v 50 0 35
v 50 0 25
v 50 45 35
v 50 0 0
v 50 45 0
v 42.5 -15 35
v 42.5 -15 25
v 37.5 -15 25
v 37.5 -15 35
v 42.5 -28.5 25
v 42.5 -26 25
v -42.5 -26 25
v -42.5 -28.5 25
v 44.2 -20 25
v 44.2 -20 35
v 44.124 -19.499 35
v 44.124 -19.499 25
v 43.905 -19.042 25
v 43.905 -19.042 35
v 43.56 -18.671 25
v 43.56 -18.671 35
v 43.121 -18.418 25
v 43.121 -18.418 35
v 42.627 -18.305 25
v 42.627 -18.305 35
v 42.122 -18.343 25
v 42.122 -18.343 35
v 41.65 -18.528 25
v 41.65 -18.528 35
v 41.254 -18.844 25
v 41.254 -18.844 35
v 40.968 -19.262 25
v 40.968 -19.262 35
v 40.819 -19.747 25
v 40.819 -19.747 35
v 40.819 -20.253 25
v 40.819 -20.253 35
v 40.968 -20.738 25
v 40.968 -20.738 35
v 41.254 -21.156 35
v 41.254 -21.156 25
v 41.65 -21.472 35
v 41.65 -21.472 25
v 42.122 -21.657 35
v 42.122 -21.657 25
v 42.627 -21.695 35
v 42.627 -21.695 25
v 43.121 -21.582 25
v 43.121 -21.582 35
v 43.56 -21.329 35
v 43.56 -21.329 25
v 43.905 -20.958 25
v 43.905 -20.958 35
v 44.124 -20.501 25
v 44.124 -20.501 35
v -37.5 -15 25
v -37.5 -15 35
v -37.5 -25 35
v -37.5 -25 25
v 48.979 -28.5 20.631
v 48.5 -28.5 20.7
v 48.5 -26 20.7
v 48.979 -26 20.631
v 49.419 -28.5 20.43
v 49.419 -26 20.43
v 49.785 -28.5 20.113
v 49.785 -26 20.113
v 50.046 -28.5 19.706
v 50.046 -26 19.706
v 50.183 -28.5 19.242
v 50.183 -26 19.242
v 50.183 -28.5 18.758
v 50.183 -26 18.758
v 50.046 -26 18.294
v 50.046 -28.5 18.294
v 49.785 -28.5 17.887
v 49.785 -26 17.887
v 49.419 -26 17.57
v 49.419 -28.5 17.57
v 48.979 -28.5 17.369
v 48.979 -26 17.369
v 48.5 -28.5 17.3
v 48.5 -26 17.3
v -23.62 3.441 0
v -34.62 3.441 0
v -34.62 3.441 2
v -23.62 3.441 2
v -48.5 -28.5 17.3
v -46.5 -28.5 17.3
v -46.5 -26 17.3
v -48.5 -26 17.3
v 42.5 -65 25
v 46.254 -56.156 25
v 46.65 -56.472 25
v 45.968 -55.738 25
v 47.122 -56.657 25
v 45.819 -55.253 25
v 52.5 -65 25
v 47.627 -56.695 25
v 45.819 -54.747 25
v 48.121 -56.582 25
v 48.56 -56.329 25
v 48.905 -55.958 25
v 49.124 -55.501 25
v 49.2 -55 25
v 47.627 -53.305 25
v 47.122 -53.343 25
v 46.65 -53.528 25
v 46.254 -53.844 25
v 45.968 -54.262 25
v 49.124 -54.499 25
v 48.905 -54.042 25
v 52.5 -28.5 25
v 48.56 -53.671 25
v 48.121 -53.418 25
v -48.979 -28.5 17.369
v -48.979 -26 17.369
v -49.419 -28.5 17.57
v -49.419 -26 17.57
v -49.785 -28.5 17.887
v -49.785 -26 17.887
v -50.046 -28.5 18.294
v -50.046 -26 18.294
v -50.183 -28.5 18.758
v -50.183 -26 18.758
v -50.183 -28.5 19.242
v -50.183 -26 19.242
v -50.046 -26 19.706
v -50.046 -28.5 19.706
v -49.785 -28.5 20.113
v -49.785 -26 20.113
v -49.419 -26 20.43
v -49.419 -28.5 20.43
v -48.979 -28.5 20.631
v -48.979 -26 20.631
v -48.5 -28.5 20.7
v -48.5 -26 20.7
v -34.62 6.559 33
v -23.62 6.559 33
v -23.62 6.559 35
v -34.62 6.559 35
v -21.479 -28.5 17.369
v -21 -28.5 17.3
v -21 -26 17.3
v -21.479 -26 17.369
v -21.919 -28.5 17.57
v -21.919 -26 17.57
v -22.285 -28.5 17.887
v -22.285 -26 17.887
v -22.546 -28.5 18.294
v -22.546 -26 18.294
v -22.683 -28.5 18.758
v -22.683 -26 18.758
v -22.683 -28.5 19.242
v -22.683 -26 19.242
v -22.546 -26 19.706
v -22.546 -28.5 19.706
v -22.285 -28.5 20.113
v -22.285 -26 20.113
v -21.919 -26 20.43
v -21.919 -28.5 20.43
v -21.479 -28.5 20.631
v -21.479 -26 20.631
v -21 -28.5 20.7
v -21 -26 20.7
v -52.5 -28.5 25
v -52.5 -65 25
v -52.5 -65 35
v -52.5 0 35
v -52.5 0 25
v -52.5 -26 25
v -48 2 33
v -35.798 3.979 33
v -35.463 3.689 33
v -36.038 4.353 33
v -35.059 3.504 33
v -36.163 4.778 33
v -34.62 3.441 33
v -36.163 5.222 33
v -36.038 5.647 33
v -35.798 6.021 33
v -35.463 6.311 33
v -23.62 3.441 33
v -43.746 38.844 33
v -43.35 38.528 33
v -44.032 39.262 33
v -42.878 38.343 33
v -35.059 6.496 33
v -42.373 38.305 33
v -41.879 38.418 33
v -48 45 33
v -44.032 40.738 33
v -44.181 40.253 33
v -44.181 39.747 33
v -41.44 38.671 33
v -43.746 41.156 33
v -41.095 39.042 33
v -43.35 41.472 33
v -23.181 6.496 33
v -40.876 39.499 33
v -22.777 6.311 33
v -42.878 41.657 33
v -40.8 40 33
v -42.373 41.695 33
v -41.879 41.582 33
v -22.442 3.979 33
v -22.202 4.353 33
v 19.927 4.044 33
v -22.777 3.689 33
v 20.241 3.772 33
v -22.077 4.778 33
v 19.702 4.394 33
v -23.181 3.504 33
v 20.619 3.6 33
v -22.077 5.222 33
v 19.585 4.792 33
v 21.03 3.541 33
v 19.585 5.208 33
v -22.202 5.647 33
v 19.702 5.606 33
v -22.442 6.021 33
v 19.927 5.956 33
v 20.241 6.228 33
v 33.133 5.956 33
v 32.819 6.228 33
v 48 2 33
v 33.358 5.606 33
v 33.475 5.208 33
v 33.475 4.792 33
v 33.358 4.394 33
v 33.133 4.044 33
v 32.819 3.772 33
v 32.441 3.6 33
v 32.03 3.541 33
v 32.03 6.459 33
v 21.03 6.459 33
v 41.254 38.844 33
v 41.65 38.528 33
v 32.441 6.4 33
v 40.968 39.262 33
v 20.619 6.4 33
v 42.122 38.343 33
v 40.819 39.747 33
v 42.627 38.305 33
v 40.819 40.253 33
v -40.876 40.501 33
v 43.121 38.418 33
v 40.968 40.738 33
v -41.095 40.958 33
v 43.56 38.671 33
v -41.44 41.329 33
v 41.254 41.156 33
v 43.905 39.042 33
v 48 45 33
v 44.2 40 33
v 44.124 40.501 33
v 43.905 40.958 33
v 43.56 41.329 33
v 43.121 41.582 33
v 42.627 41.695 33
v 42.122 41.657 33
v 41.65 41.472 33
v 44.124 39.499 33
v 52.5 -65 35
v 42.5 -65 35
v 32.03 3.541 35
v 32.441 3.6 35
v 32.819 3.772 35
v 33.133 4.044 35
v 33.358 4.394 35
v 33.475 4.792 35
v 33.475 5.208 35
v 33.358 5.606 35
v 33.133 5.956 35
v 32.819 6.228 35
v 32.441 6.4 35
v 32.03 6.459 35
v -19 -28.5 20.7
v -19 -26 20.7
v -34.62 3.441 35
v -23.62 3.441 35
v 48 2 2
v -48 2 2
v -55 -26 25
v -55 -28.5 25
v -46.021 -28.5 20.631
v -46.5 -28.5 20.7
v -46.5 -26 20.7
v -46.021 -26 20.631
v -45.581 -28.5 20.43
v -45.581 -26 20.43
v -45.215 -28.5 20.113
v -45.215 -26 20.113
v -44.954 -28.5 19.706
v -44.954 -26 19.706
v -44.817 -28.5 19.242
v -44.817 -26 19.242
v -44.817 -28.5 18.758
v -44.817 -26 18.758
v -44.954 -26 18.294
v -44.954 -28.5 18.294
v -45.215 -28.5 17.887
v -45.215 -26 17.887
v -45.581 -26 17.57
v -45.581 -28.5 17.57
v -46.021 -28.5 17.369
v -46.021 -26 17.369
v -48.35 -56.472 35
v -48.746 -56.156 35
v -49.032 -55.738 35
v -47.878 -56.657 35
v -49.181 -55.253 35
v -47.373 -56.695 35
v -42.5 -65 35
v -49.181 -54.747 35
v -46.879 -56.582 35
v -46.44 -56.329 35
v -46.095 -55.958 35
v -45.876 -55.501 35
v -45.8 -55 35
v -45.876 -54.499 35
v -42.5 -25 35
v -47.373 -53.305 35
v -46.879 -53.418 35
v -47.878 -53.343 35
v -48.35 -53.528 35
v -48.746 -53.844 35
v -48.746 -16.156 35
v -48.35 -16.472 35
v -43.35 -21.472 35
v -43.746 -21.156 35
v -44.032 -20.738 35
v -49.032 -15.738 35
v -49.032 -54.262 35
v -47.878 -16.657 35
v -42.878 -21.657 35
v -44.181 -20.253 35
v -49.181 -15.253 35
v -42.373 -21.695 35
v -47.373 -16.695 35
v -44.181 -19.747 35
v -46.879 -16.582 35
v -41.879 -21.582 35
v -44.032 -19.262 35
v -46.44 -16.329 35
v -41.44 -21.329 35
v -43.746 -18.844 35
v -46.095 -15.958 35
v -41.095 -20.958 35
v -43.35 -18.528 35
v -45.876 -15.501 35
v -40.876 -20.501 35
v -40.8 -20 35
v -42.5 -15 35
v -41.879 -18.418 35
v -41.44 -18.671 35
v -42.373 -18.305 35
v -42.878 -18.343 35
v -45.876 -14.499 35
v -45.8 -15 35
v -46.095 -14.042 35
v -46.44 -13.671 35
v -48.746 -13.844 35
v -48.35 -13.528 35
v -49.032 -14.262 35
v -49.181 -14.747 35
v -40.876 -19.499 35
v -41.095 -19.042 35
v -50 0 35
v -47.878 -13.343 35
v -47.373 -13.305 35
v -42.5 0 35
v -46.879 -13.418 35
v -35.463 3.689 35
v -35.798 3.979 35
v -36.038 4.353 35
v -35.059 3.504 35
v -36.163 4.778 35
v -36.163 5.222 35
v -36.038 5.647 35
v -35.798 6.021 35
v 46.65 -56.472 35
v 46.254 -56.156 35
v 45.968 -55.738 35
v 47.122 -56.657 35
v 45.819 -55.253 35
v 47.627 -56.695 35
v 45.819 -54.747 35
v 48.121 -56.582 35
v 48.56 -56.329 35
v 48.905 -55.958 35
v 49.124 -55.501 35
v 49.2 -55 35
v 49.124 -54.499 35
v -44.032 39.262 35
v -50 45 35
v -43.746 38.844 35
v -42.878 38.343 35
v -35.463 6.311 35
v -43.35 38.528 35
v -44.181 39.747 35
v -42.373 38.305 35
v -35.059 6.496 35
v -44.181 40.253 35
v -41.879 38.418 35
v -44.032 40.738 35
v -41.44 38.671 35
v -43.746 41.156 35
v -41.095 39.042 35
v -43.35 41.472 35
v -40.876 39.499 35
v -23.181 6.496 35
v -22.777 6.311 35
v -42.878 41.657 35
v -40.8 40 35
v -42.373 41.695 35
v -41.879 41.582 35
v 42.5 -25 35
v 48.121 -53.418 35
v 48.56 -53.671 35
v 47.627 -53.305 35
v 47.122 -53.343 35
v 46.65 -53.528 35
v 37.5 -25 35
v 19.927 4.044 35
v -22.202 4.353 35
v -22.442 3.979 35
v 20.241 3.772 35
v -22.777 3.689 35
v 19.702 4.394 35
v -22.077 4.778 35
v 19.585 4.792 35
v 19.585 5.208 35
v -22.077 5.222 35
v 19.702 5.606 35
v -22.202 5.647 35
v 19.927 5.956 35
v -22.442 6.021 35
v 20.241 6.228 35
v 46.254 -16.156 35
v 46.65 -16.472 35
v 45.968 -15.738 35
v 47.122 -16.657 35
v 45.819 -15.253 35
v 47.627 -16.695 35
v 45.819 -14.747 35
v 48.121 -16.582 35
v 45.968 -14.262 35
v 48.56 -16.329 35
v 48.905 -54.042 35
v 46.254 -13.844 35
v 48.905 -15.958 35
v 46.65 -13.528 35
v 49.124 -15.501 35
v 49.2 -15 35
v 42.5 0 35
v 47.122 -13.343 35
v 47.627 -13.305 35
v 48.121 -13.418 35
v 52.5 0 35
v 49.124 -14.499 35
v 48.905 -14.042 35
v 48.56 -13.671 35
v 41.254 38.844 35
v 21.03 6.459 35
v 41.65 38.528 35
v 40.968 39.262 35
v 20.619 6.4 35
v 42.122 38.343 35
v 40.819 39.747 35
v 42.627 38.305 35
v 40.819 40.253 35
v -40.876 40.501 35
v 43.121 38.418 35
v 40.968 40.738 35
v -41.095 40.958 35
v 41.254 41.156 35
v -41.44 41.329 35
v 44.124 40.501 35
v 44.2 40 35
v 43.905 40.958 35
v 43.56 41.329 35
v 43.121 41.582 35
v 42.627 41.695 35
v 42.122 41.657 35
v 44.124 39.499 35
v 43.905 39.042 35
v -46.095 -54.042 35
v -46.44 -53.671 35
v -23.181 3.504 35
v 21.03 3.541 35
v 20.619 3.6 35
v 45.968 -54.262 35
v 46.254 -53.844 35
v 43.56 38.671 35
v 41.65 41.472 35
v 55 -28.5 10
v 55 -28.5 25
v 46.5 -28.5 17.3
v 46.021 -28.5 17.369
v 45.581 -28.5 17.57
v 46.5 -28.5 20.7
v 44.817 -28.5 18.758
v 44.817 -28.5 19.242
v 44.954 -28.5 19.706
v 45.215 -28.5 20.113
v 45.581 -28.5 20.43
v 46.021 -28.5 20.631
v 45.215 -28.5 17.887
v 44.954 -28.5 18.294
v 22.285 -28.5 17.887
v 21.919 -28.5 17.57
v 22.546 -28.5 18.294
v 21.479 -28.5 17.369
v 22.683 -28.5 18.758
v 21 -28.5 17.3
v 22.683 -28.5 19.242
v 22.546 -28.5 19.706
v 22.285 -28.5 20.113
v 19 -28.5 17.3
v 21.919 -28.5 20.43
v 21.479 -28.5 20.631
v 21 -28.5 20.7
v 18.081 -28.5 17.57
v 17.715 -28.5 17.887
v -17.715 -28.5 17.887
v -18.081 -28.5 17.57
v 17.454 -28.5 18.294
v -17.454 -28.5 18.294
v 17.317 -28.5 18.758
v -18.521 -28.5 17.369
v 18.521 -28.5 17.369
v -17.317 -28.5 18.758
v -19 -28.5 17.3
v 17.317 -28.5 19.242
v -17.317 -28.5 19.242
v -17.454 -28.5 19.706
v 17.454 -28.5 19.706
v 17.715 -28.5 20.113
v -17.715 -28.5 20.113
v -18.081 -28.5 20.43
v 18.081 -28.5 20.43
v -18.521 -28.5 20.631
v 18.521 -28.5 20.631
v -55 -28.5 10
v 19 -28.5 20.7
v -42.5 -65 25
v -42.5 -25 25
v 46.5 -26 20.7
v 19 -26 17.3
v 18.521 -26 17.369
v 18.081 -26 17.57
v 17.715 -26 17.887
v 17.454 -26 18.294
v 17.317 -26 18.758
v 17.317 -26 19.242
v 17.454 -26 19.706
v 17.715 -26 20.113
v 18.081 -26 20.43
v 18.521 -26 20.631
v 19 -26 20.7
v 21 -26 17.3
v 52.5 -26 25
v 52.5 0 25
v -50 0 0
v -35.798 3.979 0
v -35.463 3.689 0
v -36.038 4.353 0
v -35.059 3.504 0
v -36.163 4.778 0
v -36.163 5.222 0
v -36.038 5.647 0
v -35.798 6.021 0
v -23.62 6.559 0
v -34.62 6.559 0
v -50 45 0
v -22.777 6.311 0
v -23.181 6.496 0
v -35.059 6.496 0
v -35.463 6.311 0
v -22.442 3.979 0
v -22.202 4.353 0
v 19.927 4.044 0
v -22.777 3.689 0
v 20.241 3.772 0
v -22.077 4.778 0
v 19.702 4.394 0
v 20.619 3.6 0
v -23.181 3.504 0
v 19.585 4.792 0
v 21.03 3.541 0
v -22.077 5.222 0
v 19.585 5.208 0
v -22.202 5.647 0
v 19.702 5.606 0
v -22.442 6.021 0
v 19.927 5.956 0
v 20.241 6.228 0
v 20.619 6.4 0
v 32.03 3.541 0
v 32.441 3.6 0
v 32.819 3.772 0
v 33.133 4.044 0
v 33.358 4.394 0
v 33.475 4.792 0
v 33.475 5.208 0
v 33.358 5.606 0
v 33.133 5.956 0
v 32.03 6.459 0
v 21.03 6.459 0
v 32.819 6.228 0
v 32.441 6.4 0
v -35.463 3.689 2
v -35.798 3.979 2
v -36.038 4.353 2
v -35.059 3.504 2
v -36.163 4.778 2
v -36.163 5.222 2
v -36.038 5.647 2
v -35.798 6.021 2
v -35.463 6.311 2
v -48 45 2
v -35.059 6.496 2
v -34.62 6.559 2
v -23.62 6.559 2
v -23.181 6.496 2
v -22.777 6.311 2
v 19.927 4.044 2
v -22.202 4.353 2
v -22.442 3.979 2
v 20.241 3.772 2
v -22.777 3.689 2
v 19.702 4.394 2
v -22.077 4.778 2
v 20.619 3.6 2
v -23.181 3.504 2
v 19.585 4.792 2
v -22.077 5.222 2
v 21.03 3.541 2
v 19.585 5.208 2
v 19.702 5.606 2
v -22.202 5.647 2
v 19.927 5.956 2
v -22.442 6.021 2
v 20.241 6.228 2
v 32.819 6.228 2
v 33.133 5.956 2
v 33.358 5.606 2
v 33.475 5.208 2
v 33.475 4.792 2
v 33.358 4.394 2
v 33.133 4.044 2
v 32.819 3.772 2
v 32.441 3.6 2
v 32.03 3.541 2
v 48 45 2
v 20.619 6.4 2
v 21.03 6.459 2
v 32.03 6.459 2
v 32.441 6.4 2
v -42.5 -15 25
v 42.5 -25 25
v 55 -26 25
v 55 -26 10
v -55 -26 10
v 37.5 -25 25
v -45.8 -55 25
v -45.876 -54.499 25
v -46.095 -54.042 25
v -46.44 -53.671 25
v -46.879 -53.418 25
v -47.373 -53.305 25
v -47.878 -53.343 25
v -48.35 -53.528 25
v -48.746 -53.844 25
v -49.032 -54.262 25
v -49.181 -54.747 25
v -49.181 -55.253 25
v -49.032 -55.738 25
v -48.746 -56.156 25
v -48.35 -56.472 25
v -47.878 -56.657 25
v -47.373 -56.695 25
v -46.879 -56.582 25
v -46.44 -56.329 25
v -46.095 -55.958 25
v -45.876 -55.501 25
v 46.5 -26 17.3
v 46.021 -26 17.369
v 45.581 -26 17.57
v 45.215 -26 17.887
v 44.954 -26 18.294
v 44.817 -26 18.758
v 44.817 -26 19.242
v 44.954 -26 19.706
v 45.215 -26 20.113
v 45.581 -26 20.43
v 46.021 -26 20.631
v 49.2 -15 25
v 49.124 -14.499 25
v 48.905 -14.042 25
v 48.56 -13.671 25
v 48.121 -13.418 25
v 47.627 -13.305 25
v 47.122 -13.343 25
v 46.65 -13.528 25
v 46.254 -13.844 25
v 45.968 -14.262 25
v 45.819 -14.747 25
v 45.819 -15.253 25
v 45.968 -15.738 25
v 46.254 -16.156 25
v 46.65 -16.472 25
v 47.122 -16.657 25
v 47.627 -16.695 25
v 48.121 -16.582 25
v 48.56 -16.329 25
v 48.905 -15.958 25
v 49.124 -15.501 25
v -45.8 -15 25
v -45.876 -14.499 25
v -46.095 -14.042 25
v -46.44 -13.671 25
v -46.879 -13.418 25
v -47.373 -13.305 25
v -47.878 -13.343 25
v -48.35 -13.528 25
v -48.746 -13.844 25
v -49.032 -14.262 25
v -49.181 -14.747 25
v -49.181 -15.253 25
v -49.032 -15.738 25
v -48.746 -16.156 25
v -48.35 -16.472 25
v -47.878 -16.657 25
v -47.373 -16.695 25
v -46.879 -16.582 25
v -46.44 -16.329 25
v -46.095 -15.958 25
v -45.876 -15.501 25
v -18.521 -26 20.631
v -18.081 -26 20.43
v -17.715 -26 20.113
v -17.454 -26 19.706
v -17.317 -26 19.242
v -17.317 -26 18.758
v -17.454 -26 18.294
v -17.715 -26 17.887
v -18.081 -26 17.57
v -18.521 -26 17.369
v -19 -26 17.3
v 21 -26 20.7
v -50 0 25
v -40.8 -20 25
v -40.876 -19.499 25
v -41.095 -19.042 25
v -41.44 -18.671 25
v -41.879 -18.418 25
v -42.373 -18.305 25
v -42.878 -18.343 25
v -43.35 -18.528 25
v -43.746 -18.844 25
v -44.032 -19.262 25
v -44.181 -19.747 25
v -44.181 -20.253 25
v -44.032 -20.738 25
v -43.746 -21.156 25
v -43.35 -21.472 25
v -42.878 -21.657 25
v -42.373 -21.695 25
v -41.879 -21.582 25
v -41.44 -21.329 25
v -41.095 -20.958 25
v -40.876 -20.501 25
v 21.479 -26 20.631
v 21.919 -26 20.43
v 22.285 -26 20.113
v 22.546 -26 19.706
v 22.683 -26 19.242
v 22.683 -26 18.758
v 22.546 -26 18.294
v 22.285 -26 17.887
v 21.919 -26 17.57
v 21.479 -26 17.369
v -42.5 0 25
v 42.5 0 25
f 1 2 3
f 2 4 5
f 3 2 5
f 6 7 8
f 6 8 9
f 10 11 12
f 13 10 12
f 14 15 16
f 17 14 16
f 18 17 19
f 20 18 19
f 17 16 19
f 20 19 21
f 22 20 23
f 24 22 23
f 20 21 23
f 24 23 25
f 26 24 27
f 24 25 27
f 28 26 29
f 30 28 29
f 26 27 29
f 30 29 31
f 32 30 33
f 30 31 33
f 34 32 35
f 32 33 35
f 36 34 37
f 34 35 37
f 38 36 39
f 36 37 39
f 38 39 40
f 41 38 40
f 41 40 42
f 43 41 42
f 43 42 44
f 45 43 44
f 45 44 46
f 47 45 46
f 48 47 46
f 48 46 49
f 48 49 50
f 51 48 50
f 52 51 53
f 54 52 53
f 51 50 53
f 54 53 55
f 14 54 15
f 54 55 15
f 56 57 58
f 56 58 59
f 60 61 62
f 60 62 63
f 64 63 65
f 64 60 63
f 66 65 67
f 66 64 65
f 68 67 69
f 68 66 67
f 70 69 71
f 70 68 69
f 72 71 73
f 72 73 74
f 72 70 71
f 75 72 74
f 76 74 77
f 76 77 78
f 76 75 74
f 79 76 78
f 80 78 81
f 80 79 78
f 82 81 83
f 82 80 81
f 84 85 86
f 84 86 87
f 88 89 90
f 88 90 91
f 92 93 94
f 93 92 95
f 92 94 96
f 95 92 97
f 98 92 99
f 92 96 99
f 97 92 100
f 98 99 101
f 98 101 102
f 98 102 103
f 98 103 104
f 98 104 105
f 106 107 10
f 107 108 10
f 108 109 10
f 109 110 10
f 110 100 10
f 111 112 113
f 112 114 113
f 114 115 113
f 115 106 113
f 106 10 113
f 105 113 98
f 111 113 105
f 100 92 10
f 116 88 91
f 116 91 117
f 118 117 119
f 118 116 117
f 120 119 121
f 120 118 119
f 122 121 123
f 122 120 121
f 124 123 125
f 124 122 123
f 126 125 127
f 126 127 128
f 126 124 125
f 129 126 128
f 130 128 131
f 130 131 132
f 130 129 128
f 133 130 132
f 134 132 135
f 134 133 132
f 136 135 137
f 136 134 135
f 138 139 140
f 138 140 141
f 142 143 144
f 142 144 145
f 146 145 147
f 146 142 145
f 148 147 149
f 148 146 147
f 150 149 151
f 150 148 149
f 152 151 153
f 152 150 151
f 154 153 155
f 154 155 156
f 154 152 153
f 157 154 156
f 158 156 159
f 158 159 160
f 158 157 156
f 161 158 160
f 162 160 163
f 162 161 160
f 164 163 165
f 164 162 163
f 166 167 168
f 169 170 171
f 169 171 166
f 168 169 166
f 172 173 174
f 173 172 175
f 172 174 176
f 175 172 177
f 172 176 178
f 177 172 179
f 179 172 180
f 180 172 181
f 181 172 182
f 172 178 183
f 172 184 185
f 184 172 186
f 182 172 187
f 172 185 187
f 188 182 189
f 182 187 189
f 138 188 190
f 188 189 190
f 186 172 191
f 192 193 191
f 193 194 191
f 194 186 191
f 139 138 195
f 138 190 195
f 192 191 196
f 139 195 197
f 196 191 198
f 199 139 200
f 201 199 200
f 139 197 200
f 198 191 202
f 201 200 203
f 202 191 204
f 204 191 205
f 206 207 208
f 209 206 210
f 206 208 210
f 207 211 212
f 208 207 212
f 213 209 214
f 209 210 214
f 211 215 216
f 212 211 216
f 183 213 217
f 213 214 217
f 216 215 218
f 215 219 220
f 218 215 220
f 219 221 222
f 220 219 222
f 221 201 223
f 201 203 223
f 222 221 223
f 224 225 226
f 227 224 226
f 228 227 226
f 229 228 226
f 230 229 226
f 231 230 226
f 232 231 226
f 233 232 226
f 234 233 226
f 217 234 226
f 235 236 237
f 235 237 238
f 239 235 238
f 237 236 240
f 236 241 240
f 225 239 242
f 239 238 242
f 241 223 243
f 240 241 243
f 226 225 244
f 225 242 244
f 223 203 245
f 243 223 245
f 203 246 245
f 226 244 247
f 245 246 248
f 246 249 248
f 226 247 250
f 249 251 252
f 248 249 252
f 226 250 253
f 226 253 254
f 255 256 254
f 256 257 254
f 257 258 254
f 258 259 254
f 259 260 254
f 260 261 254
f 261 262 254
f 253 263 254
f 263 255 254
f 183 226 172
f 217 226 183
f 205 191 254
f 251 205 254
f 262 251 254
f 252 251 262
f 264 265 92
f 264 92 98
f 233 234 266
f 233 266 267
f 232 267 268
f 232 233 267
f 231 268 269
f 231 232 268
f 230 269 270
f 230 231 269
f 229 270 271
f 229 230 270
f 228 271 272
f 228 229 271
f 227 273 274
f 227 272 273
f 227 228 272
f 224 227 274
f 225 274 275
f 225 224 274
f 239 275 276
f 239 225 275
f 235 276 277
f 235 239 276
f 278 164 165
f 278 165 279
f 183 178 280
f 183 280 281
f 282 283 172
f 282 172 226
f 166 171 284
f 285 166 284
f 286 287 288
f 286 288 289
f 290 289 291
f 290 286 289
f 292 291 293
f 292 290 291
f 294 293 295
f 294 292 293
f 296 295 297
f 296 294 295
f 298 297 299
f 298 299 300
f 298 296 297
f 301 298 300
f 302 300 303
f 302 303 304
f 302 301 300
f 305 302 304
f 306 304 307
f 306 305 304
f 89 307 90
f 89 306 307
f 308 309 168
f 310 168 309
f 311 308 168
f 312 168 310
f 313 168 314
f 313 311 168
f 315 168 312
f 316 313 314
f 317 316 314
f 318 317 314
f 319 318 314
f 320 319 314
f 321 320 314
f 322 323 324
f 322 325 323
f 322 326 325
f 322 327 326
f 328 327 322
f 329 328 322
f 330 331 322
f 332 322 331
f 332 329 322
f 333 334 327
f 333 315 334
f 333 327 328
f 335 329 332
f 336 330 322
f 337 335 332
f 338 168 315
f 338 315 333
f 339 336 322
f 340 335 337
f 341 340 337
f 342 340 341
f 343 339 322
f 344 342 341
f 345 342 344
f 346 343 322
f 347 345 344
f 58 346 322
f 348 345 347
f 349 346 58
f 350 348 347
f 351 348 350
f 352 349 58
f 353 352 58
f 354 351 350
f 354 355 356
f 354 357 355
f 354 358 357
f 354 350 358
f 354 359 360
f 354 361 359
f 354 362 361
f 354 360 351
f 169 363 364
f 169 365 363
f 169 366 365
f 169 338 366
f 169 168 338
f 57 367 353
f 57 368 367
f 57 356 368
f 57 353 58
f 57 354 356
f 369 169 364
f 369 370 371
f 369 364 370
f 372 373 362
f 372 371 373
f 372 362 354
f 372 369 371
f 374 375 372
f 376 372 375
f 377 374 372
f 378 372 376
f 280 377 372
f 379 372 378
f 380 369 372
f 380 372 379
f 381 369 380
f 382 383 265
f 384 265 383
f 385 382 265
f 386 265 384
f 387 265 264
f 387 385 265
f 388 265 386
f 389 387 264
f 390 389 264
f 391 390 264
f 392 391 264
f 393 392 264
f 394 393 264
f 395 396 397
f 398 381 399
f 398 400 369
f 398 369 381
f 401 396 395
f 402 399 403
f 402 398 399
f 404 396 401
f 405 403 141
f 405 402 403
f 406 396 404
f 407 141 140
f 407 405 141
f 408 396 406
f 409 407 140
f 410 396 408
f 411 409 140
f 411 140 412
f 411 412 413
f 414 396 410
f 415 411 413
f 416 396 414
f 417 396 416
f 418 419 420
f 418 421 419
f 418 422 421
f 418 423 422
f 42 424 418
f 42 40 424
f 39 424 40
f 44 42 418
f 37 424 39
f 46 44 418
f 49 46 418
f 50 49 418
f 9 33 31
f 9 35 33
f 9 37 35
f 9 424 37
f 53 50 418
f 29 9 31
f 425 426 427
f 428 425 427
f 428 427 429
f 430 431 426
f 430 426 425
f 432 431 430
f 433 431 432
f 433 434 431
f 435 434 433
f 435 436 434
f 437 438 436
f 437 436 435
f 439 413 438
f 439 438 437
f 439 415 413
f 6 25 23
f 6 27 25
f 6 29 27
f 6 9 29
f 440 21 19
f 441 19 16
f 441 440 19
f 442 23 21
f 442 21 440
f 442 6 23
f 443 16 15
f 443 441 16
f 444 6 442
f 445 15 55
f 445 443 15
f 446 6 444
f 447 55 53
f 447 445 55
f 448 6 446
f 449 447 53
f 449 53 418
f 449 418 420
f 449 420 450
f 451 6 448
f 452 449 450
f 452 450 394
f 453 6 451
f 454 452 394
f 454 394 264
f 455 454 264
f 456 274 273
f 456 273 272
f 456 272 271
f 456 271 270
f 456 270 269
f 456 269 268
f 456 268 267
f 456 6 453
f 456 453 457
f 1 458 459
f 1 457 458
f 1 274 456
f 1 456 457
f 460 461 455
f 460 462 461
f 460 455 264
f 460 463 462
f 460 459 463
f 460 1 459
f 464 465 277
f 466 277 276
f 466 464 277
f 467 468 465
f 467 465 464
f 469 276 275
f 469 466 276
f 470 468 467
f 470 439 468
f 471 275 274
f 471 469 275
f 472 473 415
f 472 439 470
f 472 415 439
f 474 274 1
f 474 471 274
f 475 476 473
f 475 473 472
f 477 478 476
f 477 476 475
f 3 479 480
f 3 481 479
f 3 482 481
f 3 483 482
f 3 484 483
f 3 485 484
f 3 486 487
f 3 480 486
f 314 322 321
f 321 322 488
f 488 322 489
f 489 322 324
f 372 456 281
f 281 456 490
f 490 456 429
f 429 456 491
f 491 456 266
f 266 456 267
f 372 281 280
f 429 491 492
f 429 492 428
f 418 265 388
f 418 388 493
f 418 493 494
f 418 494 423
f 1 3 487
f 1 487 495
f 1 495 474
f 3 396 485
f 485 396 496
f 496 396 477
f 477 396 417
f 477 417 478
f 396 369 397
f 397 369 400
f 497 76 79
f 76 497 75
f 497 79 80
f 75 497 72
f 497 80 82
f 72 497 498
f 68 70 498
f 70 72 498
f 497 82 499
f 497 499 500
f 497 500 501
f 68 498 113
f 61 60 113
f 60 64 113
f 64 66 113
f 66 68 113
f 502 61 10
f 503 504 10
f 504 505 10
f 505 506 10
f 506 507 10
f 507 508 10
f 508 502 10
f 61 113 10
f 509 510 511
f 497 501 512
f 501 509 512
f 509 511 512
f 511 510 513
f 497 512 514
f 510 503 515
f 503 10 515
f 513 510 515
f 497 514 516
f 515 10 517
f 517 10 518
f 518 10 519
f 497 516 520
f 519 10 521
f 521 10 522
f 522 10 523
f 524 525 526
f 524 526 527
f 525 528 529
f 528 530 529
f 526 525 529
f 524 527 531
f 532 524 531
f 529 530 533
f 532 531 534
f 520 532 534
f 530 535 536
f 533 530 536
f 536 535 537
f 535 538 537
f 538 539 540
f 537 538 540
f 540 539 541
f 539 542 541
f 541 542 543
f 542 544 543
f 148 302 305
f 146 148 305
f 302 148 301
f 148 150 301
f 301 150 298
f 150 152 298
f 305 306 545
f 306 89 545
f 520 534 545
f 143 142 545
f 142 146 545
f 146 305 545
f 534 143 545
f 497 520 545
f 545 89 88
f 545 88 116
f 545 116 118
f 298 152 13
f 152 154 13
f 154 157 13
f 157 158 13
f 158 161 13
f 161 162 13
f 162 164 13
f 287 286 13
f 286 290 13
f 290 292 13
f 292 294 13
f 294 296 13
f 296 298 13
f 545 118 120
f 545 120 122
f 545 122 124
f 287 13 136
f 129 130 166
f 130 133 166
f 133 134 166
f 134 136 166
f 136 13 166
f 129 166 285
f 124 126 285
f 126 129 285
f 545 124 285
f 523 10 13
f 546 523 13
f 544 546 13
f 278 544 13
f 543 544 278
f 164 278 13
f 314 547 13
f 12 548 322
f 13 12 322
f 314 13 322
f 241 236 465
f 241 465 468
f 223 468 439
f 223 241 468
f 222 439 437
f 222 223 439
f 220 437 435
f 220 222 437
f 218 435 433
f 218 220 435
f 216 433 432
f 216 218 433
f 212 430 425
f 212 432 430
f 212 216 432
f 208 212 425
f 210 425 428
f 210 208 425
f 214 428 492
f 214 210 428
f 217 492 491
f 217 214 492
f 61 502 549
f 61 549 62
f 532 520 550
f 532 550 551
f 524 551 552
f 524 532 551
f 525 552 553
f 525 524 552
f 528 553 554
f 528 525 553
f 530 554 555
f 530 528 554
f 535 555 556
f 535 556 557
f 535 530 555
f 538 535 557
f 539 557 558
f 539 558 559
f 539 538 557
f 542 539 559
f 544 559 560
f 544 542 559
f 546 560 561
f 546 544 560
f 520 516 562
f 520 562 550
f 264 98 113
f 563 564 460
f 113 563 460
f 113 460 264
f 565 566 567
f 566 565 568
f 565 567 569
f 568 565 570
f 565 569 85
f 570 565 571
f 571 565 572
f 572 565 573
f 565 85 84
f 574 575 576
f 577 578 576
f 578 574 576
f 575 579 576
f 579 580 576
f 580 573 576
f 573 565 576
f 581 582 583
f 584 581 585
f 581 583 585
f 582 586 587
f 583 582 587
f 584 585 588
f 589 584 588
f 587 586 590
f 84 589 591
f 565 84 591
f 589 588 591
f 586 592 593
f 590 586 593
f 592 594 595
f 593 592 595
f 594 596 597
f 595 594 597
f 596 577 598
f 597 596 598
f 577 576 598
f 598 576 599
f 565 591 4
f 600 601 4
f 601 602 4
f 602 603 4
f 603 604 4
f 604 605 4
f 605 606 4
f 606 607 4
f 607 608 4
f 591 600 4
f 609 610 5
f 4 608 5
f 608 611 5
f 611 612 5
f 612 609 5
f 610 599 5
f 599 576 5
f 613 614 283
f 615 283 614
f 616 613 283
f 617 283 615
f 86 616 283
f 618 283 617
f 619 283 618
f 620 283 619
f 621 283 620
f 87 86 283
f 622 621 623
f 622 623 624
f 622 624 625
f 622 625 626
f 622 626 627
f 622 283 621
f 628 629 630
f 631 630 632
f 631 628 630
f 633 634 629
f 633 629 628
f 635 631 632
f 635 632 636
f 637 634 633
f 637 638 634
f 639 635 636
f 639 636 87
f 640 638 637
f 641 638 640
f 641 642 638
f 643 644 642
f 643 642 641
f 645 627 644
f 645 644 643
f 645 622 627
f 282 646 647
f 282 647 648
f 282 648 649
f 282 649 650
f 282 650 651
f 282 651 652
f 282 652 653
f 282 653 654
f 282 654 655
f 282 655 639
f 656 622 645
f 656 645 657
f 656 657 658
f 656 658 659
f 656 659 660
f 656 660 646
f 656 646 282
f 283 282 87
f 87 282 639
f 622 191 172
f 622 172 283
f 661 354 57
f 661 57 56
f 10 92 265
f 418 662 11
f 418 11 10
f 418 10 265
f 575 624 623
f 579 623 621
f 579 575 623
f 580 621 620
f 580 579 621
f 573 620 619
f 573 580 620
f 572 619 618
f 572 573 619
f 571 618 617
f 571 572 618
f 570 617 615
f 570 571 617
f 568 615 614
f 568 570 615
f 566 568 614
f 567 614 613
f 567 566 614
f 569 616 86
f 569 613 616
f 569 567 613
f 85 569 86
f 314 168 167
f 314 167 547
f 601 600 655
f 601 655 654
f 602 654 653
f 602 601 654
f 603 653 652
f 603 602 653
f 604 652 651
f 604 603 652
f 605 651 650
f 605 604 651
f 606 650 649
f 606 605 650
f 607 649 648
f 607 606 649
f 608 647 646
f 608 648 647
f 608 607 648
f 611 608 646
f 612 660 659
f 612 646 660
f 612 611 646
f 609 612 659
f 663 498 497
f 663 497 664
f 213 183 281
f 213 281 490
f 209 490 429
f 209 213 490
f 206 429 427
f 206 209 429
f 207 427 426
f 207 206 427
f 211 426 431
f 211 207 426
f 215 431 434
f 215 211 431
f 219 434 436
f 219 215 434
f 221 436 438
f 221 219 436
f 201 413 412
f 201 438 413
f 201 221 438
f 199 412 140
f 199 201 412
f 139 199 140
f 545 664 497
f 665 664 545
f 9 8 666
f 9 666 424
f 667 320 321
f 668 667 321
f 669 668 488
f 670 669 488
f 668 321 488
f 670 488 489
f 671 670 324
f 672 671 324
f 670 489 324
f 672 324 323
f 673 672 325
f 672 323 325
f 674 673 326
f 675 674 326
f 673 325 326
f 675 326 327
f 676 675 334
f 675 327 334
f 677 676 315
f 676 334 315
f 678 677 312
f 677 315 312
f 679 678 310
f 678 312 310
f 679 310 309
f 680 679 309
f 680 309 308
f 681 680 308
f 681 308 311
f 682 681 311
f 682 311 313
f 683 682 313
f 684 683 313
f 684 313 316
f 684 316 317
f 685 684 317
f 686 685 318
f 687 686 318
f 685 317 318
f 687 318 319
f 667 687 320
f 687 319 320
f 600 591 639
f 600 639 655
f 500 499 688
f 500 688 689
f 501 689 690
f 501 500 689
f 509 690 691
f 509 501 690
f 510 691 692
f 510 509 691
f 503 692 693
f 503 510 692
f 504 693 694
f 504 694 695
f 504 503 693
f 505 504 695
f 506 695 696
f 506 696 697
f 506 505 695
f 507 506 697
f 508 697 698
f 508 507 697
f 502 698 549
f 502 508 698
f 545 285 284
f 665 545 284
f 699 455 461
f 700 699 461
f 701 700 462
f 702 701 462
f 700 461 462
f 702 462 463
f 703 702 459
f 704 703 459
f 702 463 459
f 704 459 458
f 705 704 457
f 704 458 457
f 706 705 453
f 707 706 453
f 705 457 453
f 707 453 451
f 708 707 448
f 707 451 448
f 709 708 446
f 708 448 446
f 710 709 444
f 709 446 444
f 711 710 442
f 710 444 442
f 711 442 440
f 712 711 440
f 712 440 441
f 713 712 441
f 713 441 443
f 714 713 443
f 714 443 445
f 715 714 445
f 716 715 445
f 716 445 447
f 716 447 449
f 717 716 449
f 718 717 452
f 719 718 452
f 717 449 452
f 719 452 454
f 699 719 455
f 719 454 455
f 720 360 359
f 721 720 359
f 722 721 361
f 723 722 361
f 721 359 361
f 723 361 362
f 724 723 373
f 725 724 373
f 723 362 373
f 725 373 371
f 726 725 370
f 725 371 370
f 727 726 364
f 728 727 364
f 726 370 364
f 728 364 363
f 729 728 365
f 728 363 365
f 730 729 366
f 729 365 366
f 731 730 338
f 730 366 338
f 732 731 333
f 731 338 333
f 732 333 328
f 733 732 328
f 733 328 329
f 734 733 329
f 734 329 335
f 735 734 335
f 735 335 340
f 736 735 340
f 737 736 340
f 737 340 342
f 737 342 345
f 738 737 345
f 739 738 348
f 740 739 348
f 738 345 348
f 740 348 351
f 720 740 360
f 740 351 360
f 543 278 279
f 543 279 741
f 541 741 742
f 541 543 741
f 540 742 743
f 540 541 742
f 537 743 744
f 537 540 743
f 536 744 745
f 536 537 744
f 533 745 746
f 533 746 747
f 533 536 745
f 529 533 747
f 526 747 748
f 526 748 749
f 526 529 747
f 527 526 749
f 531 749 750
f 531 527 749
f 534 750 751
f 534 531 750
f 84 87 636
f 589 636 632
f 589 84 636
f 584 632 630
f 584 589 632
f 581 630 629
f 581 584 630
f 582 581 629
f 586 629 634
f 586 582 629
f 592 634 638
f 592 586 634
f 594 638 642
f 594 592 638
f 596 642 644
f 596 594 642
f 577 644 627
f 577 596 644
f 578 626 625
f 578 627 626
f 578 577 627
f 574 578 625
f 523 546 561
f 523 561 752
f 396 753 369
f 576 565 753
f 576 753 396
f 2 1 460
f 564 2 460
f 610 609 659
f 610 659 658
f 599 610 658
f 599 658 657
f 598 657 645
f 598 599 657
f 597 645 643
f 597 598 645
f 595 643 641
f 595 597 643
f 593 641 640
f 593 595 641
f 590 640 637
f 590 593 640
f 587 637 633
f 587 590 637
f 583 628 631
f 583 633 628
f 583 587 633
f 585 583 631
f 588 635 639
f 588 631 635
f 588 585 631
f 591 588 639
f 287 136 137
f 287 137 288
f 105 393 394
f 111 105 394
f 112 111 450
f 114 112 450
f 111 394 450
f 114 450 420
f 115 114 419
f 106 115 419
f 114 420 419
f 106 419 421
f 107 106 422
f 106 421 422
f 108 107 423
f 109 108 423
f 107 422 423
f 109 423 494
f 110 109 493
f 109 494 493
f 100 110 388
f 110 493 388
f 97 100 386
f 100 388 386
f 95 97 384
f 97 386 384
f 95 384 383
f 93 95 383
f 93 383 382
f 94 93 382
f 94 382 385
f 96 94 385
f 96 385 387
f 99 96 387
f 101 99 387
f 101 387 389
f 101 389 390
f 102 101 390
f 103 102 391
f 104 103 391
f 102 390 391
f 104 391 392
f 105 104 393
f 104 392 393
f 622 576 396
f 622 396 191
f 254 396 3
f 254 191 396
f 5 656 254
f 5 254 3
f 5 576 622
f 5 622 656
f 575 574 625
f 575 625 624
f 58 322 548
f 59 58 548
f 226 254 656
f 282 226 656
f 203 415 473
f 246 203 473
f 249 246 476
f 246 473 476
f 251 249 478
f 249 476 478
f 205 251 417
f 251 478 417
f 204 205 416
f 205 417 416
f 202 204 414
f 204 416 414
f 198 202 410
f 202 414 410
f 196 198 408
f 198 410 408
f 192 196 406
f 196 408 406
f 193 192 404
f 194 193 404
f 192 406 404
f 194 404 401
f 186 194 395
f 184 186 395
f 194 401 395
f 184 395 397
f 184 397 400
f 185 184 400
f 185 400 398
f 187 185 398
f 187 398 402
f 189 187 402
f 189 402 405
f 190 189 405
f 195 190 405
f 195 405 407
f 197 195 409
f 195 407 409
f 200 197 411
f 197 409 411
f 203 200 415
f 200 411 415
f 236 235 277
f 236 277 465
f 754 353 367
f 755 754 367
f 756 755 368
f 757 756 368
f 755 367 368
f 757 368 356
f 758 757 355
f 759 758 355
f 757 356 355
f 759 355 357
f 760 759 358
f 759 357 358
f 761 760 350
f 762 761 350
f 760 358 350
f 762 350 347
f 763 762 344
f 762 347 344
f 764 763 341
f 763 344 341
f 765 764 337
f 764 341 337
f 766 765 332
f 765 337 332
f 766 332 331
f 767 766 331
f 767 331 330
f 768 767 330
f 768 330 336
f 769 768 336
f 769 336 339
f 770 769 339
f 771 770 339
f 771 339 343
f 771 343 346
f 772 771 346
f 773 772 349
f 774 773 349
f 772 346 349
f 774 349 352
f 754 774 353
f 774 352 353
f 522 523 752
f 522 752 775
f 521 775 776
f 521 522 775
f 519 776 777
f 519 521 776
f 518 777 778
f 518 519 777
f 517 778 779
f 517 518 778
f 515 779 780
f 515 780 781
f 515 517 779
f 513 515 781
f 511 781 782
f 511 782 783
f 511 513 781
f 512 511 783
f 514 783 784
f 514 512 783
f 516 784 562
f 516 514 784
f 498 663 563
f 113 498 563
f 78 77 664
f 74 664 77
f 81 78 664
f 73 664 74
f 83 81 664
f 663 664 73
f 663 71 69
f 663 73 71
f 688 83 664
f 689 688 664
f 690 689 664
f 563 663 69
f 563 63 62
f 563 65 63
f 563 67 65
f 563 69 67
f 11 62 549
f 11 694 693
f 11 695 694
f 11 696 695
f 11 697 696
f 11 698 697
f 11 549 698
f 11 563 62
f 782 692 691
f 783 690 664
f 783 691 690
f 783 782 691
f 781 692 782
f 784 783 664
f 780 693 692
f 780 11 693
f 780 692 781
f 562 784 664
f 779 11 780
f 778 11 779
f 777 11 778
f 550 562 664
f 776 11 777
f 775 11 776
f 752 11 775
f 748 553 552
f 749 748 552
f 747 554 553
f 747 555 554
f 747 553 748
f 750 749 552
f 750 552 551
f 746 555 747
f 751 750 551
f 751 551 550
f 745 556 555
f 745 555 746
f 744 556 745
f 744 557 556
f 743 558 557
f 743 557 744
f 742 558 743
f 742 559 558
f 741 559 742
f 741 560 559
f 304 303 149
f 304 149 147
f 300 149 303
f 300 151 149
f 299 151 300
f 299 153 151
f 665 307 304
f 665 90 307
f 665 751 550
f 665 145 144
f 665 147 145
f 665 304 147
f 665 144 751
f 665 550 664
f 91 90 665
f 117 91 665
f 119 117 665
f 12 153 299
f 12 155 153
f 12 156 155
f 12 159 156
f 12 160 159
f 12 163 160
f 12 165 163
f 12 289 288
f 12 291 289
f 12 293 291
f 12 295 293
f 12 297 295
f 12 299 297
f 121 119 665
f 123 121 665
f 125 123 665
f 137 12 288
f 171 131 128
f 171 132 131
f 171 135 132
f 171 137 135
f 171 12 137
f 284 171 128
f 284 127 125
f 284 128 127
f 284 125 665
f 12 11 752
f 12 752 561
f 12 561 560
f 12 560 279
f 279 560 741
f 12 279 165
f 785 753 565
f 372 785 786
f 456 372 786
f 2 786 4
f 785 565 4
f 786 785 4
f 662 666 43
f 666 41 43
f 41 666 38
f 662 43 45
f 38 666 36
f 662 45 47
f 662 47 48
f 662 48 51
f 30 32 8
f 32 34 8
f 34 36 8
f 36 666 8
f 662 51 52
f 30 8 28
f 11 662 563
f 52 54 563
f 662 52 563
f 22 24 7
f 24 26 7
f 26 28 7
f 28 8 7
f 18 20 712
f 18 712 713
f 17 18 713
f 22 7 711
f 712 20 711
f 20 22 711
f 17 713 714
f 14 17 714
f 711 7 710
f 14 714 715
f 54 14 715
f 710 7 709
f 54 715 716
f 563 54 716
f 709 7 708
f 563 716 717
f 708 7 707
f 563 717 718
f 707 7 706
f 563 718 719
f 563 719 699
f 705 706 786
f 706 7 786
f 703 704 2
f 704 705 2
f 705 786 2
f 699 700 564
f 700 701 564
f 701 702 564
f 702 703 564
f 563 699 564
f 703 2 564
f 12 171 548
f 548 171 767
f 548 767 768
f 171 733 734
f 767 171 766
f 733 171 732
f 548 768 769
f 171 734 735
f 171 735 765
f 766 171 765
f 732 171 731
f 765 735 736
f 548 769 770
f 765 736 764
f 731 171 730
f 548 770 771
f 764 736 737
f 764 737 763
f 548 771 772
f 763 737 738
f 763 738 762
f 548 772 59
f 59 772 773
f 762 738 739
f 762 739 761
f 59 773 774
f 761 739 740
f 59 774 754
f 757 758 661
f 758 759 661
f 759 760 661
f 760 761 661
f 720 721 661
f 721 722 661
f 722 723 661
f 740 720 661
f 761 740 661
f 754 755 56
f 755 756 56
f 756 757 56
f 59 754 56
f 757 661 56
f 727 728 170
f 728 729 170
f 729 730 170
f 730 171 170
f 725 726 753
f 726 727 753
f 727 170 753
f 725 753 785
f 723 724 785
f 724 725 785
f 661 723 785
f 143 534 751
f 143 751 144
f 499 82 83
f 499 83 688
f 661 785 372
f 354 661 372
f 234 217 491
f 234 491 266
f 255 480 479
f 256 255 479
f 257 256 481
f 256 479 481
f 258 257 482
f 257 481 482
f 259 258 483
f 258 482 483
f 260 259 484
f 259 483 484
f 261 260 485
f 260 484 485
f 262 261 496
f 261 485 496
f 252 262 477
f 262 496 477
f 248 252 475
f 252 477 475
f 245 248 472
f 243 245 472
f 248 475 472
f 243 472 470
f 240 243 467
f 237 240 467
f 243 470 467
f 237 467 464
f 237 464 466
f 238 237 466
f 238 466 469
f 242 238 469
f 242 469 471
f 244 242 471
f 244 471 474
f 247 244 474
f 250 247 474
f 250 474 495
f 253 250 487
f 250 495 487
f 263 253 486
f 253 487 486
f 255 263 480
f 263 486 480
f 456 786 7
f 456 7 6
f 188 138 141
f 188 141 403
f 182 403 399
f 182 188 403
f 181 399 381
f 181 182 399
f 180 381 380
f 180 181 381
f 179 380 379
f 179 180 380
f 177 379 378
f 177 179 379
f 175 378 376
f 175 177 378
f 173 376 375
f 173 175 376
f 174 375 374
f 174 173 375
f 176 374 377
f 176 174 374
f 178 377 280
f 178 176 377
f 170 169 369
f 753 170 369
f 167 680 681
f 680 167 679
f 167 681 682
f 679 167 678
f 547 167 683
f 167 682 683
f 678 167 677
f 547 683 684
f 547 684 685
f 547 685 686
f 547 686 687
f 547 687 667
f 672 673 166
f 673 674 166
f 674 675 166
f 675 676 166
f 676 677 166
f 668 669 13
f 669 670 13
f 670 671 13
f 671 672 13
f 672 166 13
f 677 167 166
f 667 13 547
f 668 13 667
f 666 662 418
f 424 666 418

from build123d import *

# Parameters (mm, degrees)
V3_BOX_FOOTPRINT_100_X_45_MM_W                 = 100
V3_BOX_FOOTPRINT_100_X_45_MM_H                 = 45
V3_BOX_HEIGHT_35_MM_DEPTH                      = 35
V3_REAR_OPENING_96_X_31_MM_W                   = 96
V3_REAR_OPENING_96_X_31_MM_H                   = 31
V3_CAVITY_ALL_WALLS_2_MM_DEPTH                 = 43
V3_SQUARE_BEAMS_10_X_10_PITCH_95_MM_W          = 10
V3_SQUARE_BEAMS_10_X_10_PITCH_95_MM_H          = 10
V3_FORWARD_BEAM_LENGTH_65_MM_DEPTH             = 65
V3_LEFT_PCB_EAR_PROFILE_W                      = 10
V3_LEFT_PCB_EAR_PROFILE_H                      = 10
V3_LEFT_INWARD_EAR_5_MM_DEPTH                  = 5
V3_RIGHT_PCB_EAR_PROFILE_W                     = 10
V3_RIGHT_PCB_EAR_PROFILE_H                     = 10
V3_RIGHT_INWARD_EAR_5_MM_DEPTH                 = 5
V3_PCB_ROOF_PAIR_PITCH_85_MM_R                 = 1.7
V3_M3_ROOF_HOLES_DIAMETER_3_4_MM_DEPTH         = 2
V3_PCB_FORWARD_PAIR_ROW_SPACING_60_MM_R        = 1.7
V3_M3_PCB_EAR_HOLES_DEPTH                      = 10
V3_CHASSIS_TOP_HOLES_WIDTH_95_DEPTH_40_M_R     = 1.7
V3_M3_BEAM_TOP_BOTTOM_HOLES_DEPTH              = 10
V3_HANGING_PLATE_OFFSET_26_THICKNESS_2_5_W     = 110
V3_HANGING_PLATE_OFFSET_26_THICKNESS_2_5_H     = 2.5
V3_MOUNTING_PLATE_DOWNWARD_15_MM_WIDTH_1_DEPTH = 15
FOUR_HORIZONTAL_SLOTS_3_4_X_5_4_MM_DEPTH       = 2.5
CUT_EXTRUDE_1_DEPTH                            = 93.059763198


with BuildPart() as part:
    # V3 box footprint 100 x 45 mm → V3 box height 35 mm (new body)
    with BuildSketch(Plane.XY):
        with Locations((0, 22.5)):
            Rectangle(V3_BOX_FOOTPRINT_100_X_45_MM_W, V3_BOX_FOOTPRINT_100_X_45_MM_H)
    extrude(amount=V3_BOX_HEIGHT_35_MM_DEPTH)

    # V3 rear opening 96 x 31 mm → V3 cavity all walls 2 mm (cut)
    with BuildSketch(Plane(origin=(0, 45, 0), x_dir=(1, 0, 0), z_dir=(0, 1, 0))):
        with Locations((0, -17.5)):
            Rectangle(V3_REAR_OPENING_96_X_31_MM_W, V3_REAR_OPENING_96_X_31_MM_H)
    extrude(amount=-V3_CAVITY_ALL_WALLS_2_MM_DEPTH, mode=Mode.SUBTRACT)

    # V3 square beams 10 x 10 pitch 95 mm → V3 forward beam length 65 mm (add)
    with BuildSketch(Plane.XZ):
        with Locations((-47.5, 30)):
            Rectangle(V3_SQUARE_BEAMS_10_X_10_PITCH_95_MM_W, V3_SQUARE_BEAMS_10_X_10_PITCH_95_MM_H)
        with Locations((47.5, 30)):
            Rectangle(V3_SQUARE_BEAMS_10_X_10_PITCH_95_MM_W, V3_SQUARE_BEAMS_10_X_10_PITCH_95_MM_H)
    extrude(amount=V3_FORWARD_BEAM_LENGTH_65_MM_DEPTH)

    # V3 left PCB ear profile → V3 left inward ear 5 mm (add)
    with BuildSketch(Plane(origin=(-42.5, 0, 0), x_dir=(0, 0, -1), z_dir=(1, 0, 0))):
        with Locations((-30, -20)):
            Rectangle(V3_LEFT_PCB_EAR_PROFILE_W, V3_LEFT_PCB_EAR_PROFILE_H)
    extrude(amount=V3_LEFT_INWARD_EAR_5_MM_DEPTH)

    # V3 right PCB ear profile → V3 right inward ear 5 mm (add)
    with BuildSketch(Plane.ZY.offset(-42.5)):
        with Locations((30, -20)):
            Rectangle(V3_RIGHT_PCB_EAR_PROFILE_W, V3_RIGHT_PCB_EAR_PROFILE_H)
    extrude(amount=V3_RIGHT_INWARD_EAR_5_MM_DEPTH)

    # V3 PCB roof pair pitch 85 mm → V3 M3 roof holes diameter 3.4 mm (cut)
    with BuildSketch(Plane.XY.offset(35)):
        with Locations((-42.5, 40)):
            Circle(V3_PCB_ROOF_PAIR_PITCH_85_MM_R)
        with Locations((42.5, 40)):
            Circle(V3_PCB_ROOF_PAIR_PITCH_85_MM_R)
    extrude(amount=-V3_M3_ROOF_HOLES_DIAMETER_3_4_MM_DEPTH, mode=Mode.SUBTRACT)

    # V3 PCB forward pair row spacing 60 mm → V3 M3 PCB ear holes (cut)
    with BuildSketch(Plane.XY.offset(35)):
        with Locations((-42.5, -20)):
            Circle(V3_PCB_FORWARD_PAIR_ROW_SPACING_60_MM_R)
        with Locations((42.5, -20)):
            Circle(V3_PCB_FORWARD_PAIR_ROW_SPACING_60_MM_R)
    extrude(amount=-V3_M3_PCB_EAR_HOLES_DEPTH, mode=Mode.SUBTRACT)

    # V3 chassis top holes width 95 depth 40 mm → V3 M3 beam top bottom holes (cut)
    with BuildSketch(Plane.XY.offset(35)):
        with Locations((-47.5, -55)):
            Circle(V3_CHASSIS_TOP_HOLES_WIDTH_95_DEPTH_40_M_R)
        with Locations((-47.5, -15)):
            Circle(V3_CHASSIS_TOP_HOLES_WIDTH_95_DEPTH_40_M_R)
        with Locations((47.5, -55)):
            Circle(V3_CHASSIS_TOP_HOLES_WIDTH_95_DEPTH_40_M_R)
        with Locations((47.5, -15)):
            Circle(V3_CHASSIS_TOP_HOLES_WIDTH_95_DEPTH_40_M_R)
    extrude(amount=-V3_M3_BEAM_TOP_BOTTOM_HOLES_DEPTH, mode=Mode.SUBTRACT)

    # V3 hanging plate offset 26 thickness 2.5 mm → V3 mounting plate downward 15 mm width 110 (add)
    with BuildSketch(Plane(origin=(0, 0, 25), x_dir=(-1, 0, 0), z_dir=(0, 0, -1))):
        with Locations((0, -27.25)):
            Rectangle(V3_HANGING_PLATE_OFFSET_26_THICKNESS_2_5_W, V3_HANGING_PLATE_OFFSET_26_THICKNESS_2_5_H)
    extrude(amount=V3_MOUNTING_PLATE_DOWNWARD_15_MM_WIDTH_1_DEPTH)

    # V3 slots 6 mm below beam underside centers 20 and 47.5 → Four horizontal slots 3.4 x 5.4 mm (cut)
    with BuildSketch(Plane.XZ.offset(28.5)):
        with BuildLine():
            Line((-48.5, 20.7), (-46.5, 20.7))
            ThreePointArc((-46.5, 20.7), (-44.8, 19), (-46.5, 17.3))
            Line((-46.5, 17.3), (-48.5, 17.3))
            ThreePointArc((-48.5, 17.3), (-50.2, 19), (-48.5, 20.7))
        make_face()
        with BuildLine():
            Line((-21, 20.7), (-19, 20.7))
            ThreePointArc((-19, 20.7), (-17.3, 19), (-19, 17.3))
            Line((-19, 17.3), (-21, 17.3))
            ThreePointArc((-21, 17.3), (-22.7, 19), (-21, 20.7))
        make_face()
        with BuildLine():
            Line((19, 20.7), (21, 20.7))
            ThreePointArc((21, 20.7), (22.7, 19), (21, 17.3))
            Line((21, 17.3), (19, 17.3))
            ThreePointArc((19, 17.3), (17.3, 19), (19, 20.7))
        make_face()
        with BuildLine():
            Line((46.5, 20.7), (48.5, 20.7))
            ThreePointArc((48.5, 20.7), (50.2, 19), (48.5, 17.3))
            Line((48.5, 17.3), (46.5, 17.3))
            ThreePointArc((46.5, 17.3), (44.8, 19), (46.5, 20.7))
        make_face()
    extrude(amount=-FOUR_HORIZONTAL_SLOTS_3_4_X_5_4_MM_DEPTH, mode=Mode.SUBTRACT)

    # 草图2 → 切除-拉伸1 (cut, through all)
    with BuildSketch(Plane(origin=(0, 0, 0), x_dir=(-1, 0, 0), z_dir=(0, 0, -1))):
        with BuildLine():
            Line((-32.029979042, 6.459471041), (-21.029979042, 6.459471041))
            ThreePointArc((-21.029979042, 6.459471041), (-19.570508001, 5), (-21.029979042, 3.540528959))
            Line((-21.029979042, 3.540528959), (-32.029979042, 3.540528959))
            ThreePointArc((-32.029979042, 3.540528959), (-33.489450083, 5), (-32.029979042, 6.459471041))
        make_face()
        with BuildLine():
            Line((23.620107008, 6.558669056), (34.620107008, 6.558669056))
            ThreePointArc((34.620107008, 6.558669056), (36.178776063, 5), (34.620107008, 3.441330944))
            Line((34.620107008, 3.441330944), (23.620107008, 3.441330944))
            ThreePointArc((23.620107008, 3.441330944), (22.061437952, 5), (23.620107008, 6.558669056))
        make_face()
    extrude(amount=-CUT_EXTRUDE_1_DEPTH, mode=Mode.SUBTRACT)


solid = part.part
